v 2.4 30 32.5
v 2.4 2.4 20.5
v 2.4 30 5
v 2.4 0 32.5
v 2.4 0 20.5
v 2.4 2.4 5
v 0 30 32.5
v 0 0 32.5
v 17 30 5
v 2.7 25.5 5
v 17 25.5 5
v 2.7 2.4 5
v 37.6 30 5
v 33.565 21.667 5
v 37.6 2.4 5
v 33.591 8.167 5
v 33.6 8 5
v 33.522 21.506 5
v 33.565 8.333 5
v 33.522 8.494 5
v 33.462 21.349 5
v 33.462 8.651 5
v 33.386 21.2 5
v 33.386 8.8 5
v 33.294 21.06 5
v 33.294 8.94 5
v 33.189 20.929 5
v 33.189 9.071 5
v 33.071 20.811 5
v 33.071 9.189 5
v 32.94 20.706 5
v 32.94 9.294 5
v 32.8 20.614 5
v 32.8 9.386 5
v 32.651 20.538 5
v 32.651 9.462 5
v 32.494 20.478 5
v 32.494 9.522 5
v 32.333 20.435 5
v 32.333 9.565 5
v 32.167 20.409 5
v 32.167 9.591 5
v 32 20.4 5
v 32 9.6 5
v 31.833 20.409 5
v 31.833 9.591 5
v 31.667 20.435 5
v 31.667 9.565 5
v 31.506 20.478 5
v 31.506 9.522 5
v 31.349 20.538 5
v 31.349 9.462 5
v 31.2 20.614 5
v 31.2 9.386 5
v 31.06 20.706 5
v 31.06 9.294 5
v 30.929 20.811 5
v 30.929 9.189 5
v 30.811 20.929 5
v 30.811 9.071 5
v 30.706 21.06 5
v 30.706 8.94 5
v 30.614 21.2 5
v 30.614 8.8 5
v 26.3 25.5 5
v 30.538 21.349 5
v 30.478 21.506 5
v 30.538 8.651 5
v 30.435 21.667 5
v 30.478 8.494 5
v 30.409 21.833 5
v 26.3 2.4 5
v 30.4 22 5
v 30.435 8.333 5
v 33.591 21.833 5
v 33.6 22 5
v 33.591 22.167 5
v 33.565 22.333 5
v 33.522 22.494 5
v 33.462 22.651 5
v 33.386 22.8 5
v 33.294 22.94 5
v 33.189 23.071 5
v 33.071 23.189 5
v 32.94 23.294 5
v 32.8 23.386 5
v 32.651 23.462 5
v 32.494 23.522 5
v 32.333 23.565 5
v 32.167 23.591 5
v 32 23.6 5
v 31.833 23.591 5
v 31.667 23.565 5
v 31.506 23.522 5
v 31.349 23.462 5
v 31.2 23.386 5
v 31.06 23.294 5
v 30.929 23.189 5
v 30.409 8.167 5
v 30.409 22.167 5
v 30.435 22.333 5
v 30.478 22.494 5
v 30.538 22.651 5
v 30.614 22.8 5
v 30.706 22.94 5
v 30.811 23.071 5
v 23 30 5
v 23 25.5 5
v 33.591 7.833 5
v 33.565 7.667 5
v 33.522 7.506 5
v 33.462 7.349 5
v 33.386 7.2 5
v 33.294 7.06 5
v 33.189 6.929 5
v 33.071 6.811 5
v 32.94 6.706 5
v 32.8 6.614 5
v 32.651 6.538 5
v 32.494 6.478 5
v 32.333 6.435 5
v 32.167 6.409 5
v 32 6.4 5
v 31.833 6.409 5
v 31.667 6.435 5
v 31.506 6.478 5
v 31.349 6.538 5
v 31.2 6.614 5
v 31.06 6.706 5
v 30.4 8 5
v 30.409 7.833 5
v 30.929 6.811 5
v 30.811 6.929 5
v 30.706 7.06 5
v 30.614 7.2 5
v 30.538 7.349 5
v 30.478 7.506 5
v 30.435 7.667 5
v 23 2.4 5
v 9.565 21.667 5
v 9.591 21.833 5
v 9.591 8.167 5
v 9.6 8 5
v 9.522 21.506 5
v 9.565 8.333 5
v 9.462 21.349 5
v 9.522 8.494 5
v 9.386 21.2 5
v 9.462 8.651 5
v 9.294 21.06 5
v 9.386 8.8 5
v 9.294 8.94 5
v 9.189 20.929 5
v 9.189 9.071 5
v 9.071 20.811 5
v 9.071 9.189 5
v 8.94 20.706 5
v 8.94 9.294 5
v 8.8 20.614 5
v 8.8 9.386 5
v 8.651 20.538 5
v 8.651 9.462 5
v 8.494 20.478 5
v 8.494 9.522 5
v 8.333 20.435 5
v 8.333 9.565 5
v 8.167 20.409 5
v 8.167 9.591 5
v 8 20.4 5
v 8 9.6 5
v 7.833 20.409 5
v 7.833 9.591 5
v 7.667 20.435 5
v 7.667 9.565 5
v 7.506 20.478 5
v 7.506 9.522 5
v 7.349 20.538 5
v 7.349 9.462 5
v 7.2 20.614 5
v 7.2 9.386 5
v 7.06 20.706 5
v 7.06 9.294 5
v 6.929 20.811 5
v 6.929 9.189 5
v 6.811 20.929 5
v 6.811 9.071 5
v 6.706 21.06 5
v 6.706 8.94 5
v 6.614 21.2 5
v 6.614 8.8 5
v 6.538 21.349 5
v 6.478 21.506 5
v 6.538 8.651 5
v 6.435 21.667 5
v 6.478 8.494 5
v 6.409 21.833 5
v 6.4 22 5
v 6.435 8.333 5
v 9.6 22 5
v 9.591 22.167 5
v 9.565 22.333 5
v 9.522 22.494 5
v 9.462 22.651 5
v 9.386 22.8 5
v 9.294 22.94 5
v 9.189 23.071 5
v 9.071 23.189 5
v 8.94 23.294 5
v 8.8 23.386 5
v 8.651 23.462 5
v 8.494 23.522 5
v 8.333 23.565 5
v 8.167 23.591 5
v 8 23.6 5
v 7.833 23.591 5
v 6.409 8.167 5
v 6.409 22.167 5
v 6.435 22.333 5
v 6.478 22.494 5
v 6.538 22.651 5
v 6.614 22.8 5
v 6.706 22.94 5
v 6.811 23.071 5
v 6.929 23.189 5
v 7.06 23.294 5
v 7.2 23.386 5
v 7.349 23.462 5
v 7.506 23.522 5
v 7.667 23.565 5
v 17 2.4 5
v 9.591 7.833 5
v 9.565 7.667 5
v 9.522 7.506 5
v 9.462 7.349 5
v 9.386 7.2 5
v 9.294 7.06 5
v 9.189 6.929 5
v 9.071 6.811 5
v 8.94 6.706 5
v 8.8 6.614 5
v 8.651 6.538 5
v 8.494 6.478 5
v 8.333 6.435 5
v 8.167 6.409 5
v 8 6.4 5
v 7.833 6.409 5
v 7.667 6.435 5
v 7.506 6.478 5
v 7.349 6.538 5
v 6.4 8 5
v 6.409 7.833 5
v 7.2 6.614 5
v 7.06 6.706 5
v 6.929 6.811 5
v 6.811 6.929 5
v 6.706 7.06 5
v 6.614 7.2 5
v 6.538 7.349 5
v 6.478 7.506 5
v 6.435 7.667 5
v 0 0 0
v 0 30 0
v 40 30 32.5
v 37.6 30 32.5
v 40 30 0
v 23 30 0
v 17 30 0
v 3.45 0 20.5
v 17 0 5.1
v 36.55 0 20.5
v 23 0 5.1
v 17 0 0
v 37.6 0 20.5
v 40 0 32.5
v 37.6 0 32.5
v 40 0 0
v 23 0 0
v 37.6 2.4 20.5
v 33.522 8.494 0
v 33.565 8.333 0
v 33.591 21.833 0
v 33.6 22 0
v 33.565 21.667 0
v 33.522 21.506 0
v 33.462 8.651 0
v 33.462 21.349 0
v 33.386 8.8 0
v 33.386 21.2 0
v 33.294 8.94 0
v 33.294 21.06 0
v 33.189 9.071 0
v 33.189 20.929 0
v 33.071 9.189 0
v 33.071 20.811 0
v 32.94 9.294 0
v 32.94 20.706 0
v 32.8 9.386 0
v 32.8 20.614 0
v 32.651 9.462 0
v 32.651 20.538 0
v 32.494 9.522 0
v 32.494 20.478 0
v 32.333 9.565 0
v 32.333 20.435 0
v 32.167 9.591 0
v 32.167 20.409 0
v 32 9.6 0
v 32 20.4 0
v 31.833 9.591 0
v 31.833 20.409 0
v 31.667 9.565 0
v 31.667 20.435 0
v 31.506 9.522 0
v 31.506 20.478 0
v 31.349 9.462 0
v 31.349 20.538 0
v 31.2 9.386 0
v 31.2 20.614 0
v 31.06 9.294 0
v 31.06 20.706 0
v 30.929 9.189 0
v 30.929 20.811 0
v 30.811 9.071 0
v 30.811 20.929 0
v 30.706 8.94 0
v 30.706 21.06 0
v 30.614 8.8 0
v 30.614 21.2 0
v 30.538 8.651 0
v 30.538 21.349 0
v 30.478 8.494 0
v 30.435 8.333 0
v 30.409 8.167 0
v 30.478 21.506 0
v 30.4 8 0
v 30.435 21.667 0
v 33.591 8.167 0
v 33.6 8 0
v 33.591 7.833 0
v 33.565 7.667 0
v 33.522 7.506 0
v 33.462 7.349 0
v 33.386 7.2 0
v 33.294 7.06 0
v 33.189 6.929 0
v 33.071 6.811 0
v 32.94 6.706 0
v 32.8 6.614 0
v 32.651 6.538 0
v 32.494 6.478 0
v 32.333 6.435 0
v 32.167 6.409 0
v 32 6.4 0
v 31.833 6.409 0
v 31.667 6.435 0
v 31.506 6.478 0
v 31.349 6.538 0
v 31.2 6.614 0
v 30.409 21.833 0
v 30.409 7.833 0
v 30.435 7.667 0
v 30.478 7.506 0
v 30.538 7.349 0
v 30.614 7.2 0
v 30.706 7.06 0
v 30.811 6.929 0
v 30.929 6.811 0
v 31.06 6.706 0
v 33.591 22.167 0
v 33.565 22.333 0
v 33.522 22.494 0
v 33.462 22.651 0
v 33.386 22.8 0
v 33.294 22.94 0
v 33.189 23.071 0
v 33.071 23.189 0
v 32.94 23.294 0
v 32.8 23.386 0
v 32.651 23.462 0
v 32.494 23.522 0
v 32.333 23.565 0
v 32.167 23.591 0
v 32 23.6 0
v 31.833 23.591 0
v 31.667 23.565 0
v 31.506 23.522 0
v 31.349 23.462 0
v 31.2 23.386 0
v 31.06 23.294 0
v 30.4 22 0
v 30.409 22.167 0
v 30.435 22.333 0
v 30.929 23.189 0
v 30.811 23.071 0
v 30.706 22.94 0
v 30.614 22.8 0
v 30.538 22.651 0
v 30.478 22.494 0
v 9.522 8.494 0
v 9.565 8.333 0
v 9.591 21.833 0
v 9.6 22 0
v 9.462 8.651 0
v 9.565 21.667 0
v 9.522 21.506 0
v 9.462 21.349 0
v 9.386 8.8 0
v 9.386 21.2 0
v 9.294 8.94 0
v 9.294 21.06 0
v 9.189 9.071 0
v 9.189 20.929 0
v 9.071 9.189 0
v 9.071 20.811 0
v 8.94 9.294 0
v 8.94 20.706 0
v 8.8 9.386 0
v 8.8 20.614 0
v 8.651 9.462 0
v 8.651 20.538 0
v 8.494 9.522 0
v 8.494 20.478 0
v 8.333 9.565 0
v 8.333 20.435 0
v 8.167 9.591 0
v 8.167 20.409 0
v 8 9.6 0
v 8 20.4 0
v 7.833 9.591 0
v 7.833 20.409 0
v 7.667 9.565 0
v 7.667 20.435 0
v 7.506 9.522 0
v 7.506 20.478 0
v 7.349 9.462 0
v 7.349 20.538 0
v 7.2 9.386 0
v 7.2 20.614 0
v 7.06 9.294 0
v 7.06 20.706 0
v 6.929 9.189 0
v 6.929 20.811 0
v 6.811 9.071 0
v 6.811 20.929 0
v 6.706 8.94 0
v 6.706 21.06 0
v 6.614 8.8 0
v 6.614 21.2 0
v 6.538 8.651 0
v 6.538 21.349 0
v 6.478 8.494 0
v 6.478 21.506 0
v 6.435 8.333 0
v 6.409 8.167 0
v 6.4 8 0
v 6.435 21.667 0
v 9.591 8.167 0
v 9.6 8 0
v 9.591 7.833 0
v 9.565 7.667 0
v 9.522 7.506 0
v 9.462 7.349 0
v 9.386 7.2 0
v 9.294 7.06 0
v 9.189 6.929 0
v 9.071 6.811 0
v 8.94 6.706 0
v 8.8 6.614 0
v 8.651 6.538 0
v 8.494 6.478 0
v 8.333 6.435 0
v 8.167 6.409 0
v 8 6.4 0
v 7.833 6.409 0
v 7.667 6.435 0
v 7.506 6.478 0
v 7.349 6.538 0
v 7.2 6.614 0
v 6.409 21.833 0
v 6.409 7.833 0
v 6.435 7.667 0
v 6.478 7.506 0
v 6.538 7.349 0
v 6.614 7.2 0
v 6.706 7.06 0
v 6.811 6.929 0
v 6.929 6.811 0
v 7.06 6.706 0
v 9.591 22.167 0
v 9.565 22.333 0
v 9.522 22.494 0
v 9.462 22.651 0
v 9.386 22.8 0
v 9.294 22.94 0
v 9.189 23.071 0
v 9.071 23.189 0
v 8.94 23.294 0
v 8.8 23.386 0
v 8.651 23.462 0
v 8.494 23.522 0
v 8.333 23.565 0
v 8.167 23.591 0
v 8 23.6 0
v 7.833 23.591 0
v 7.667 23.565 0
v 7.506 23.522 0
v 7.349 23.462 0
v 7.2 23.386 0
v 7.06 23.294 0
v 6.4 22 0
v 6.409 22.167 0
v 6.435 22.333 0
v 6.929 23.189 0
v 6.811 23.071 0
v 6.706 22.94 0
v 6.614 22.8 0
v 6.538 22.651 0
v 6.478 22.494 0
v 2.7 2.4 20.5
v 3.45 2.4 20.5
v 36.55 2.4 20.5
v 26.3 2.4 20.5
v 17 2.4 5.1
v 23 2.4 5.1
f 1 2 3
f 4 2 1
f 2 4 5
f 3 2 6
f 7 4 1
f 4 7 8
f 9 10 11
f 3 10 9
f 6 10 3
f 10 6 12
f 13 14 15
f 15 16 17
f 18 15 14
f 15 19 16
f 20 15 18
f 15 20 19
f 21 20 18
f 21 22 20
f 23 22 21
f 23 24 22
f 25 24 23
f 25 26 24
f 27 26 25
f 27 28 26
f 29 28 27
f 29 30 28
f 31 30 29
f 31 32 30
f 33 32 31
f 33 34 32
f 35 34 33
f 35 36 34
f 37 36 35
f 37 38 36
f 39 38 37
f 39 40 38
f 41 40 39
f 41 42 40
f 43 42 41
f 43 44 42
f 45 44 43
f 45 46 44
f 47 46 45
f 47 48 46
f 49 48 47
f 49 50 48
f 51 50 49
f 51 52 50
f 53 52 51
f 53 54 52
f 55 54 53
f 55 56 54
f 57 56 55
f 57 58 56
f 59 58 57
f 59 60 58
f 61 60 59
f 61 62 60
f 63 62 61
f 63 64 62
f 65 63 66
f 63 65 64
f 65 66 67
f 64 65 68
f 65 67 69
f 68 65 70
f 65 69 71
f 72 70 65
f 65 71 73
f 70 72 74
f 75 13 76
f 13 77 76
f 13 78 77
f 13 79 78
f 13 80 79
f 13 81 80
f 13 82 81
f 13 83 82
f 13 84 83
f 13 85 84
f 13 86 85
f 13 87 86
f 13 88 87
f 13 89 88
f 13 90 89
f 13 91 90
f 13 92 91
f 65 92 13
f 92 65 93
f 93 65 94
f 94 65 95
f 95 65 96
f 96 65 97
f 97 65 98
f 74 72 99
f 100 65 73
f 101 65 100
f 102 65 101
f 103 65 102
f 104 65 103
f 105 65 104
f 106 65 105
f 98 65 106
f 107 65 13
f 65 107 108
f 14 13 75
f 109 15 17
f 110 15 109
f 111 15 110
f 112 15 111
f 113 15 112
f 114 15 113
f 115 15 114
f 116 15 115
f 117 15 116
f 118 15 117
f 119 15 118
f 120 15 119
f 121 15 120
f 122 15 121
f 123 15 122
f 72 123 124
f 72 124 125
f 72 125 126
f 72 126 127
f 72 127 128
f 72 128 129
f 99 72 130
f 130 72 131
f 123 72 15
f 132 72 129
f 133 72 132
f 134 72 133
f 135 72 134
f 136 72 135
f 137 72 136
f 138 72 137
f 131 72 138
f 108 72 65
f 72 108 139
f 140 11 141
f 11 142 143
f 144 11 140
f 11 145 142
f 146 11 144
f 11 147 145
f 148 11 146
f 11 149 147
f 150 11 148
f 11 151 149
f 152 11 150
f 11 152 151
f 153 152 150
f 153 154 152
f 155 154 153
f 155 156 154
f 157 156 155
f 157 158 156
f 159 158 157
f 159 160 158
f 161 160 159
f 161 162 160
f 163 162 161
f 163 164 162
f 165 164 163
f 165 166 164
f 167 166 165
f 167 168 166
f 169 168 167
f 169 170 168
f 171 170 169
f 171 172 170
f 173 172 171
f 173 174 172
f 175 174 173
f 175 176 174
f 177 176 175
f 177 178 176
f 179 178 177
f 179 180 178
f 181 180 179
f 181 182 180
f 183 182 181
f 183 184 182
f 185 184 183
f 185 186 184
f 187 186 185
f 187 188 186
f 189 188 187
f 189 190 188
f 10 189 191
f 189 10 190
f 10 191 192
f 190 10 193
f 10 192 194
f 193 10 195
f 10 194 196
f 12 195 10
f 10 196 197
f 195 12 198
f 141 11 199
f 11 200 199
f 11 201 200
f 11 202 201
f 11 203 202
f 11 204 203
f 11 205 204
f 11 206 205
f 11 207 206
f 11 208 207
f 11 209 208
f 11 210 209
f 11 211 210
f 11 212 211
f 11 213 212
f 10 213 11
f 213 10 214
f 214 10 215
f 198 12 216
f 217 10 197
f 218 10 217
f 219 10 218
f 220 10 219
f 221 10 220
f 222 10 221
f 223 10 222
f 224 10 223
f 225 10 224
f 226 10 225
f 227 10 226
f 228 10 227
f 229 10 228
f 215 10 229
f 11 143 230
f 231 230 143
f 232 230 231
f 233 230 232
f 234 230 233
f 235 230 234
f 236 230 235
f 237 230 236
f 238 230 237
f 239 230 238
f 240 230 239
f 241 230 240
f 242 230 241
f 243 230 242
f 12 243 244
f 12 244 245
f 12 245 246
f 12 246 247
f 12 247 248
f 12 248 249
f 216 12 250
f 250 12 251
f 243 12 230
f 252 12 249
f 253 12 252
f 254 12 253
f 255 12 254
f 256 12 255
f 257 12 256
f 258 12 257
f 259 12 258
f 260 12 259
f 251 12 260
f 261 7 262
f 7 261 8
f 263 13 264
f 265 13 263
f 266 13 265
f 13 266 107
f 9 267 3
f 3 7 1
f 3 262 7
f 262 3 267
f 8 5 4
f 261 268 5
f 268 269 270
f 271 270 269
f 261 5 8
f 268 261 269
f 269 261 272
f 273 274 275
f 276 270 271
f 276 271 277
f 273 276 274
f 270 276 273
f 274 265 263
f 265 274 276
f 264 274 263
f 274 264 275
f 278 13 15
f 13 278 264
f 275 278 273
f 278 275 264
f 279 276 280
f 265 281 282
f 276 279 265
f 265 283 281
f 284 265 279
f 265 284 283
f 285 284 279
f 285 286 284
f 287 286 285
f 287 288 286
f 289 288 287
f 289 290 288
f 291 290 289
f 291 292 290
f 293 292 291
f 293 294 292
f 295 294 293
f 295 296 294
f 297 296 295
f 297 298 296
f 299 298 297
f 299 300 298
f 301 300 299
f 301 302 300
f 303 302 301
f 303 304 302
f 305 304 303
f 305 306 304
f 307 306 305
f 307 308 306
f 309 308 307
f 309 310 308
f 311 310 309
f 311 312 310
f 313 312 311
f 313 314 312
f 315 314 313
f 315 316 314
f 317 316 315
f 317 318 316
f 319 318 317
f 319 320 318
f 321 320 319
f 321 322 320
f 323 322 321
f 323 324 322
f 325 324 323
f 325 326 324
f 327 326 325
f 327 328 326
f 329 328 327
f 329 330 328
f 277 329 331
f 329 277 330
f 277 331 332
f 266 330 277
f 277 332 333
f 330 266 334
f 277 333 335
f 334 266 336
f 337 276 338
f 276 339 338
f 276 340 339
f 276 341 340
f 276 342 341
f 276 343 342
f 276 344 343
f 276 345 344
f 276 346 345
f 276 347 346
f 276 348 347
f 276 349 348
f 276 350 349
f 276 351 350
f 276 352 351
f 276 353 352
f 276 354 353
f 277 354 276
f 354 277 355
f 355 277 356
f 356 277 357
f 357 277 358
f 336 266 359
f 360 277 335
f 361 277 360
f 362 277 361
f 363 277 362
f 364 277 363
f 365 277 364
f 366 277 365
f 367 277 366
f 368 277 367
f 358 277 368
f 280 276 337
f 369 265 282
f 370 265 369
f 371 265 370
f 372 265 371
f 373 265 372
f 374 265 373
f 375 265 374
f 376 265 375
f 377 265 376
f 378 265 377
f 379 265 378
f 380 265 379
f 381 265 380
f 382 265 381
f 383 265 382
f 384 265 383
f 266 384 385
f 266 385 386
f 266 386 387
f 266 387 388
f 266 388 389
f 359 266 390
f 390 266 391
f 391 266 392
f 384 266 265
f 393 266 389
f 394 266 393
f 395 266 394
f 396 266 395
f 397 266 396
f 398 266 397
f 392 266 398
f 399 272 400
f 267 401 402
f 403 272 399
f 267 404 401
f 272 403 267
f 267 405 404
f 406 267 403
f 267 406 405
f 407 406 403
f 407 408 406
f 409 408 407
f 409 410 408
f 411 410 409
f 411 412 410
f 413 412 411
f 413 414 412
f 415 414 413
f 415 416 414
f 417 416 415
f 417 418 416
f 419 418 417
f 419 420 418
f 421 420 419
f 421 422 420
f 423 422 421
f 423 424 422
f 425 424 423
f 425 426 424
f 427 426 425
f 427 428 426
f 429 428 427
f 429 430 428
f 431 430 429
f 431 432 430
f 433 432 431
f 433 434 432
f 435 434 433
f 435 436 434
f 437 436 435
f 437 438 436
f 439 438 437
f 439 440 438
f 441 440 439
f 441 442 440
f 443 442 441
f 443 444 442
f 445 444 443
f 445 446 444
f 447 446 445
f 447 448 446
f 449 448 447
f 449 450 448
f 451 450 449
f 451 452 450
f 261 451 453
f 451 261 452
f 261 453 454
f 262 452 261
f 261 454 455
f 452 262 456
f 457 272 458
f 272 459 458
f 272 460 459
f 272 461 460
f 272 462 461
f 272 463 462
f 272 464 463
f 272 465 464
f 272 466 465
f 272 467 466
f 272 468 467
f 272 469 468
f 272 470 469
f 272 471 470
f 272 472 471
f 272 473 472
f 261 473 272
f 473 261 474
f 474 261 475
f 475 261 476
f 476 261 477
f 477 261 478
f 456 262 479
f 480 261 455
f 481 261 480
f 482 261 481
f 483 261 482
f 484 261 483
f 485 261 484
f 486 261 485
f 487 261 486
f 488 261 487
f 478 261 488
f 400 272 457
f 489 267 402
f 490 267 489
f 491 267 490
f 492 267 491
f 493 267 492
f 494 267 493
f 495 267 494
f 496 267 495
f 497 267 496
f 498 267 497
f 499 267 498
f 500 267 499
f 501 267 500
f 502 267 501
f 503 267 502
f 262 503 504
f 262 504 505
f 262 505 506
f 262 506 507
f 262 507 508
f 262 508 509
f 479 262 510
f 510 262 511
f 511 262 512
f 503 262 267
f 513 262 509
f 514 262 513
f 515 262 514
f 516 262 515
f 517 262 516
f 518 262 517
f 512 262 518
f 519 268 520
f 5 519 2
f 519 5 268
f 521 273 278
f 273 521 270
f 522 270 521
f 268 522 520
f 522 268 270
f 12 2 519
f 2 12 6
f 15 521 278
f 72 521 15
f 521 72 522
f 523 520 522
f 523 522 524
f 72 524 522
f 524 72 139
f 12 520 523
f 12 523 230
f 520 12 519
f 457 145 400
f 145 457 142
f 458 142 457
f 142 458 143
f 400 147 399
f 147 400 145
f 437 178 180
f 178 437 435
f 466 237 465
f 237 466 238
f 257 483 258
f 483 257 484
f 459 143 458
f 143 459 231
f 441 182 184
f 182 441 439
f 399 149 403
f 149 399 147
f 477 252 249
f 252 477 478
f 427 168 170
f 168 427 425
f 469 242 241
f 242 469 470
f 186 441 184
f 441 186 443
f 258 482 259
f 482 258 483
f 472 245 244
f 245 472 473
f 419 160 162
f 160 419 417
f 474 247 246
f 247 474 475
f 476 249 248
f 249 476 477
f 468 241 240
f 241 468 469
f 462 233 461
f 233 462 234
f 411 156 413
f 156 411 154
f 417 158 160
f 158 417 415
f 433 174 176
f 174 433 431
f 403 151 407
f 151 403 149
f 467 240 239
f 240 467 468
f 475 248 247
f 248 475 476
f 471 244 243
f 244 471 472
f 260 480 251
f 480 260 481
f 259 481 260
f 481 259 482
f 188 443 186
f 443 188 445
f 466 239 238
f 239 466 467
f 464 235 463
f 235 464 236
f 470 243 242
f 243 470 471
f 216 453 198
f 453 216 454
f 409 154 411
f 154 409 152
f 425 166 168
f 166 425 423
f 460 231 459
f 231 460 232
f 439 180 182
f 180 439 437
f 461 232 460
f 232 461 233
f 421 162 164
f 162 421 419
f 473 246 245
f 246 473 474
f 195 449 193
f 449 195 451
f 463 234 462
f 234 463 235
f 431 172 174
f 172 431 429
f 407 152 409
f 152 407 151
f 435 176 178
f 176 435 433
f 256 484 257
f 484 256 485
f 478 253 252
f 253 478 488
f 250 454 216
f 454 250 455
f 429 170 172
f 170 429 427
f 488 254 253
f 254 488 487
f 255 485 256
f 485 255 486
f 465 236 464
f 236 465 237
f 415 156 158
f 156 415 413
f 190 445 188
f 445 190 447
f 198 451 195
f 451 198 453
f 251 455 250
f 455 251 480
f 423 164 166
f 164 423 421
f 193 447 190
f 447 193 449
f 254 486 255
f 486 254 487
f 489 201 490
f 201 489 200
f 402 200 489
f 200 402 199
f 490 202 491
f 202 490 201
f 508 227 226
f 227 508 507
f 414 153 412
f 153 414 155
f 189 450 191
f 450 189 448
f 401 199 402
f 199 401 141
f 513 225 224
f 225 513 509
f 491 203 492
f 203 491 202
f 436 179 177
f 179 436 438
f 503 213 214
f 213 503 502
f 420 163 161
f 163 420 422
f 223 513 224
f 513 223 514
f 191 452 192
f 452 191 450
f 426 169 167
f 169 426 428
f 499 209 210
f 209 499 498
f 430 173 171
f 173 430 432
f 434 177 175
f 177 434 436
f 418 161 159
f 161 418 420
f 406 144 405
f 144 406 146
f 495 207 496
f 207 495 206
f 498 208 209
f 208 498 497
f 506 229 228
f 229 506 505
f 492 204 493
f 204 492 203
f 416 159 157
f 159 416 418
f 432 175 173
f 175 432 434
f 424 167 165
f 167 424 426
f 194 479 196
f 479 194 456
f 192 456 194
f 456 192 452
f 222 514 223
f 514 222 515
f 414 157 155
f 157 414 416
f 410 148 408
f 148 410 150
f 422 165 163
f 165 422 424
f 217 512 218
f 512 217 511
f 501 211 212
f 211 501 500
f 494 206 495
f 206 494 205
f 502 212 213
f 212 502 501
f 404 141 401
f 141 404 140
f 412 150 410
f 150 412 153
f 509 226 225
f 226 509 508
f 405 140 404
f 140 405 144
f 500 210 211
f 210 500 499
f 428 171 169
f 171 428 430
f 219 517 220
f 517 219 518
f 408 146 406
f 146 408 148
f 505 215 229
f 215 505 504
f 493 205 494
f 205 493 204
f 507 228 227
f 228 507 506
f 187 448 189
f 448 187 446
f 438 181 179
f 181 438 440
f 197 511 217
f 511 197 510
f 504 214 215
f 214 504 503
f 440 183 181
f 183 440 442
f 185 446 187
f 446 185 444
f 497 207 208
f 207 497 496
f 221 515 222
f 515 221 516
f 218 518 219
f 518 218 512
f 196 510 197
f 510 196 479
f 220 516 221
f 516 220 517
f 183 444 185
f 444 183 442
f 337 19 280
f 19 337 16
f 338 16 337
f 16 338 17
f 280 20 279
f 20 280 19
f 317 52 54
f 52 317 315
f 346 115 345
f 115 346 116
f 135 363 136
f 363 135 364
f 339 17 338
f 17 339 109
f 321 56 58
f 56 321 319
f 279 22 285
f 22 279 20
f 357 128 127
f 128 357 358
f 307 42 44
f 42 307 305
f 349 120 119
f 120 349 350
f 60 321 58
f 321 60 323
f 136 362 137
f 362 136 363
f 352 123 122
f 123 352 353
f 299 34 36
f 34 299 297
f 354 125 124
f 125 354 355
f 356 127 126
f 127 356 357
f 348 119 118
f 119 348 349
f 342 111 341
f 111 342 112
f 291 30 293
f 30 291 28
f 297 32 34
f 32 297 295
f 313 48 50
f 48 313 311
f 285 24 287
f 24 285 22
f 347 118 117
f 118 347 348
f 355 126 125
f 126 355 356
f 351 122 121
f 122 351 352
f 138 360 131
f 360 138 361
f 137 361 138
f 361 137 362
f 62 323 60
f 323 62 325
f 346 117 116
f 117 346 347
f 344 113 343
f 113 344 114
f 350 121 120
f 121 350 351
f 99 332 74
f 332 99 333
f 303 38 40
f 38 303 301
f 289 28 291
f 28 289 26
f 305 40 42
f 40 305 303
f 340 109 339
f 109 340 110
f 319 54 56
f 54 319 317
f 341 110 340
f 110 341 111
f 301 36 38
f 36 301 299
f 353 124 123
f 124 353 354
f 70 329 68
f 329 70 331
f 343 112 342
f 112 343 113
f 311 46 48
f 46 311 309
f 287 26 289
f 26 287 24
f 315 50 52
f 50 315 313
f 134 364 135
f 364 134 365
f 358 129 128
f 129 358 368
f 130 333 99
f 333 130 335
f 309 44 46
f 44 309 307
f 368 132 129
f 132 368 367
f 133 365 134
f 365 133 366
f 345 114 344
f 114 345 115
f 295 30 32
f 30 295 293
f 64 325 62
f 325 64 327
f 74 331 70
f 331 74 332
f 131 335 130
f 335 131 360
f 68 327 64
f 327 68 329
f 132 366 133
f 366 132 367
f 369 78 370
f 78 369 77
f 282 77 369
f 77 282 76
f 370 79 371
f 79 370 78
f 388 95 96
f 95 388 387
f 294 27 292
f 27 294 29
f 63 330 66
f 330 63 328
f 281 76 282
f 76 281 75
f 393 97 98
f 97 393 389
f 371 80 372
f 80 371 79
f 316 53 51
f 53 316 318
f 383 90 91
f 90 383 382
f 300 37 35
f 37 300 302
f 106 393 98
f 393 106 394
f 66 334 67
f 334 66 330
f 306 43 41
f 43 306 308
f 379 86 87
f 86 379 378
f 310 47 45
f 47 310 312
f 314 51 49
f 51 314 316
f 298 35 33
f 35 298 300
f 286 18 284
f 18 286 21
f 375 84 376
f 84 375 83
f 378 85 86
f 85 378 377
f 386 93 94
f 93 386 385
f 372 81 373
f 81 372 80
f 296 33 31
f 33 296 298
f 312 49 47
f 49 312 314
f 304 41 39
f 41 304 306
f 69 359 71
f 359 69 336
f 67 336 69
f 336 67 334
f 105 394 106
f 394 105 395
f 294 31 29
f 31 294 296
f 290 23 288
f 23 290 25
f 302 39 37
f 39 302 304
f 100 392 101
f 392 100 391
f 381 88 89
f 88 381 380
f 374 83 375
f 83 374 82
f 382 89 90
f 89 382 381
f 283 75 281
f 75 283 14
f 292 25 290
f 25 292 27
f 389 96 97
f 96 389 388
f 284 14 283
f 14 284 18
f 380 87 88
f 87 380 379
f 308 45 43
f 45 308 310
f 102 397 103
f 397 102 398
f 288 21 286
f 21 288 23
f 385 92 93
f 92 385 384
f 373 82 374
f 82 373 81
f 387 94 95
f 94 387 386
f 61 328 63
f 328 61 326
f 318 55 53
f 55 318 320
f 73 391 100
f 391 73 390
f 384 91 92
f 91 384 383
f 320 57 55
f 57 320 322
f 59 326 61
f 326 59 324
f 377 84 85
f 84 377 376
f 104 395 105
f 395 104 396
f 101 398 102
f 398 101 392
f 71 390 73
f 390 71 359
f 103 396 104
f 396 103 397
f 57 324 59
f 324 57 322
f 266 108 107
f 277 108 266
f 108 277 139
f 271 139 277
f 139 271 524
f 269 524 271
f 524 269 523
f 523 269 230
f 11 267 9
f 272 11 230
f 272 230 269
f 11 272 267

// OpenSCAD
// file: parameters.scad
// =============================================================================
// Coil Winder - Common Parameters
// DTU 34621 Metal Detector Project
// =============================================================================

// -----------------------------------------------------------------------------
// Hardware Dimensions
// -----------------------------------------------------------------------------

// M8 Threaded Rod (Spindle)
spindle_dia = 8;
spindle_length = 300;

// 608ZZ Bearing (Skateboard bearing)
bearing_od = 22;
bearing_id = 8;
bearing_width = 7;

// M3 Hardware
m3_bolt_dia = 3.2;
m3_nut_dia = 6.4;
m3_nut_height = 2.4;
m3_head_dia = 5.5;
m3_head_height = 3;

// M8 Hardware
m8_nut_dia = 14.6;
m8_nut_height = 6.5;

// -----------------------------------------------------------------------------
// Servo Dimensions (SG90 / MG90S style)
// -----------------------------------------------------------------------------

servo_body_w = 23;
servo_body_h = 22.5;
servo_body_d = 12.5;
servo_tab_w = 32.5;
servo_tab_h = 2.5;
servo_tab_offset = 15.5;  // from bottom
servo_mount_hole_spacing = 28;
servo_shaft_offset = 5.5;  // from center of body
servo_horn_length = 15;

// -----------------------------------------------------------------------------
// ITR8307 Optical Sensor
// -----------------------------------------------------------------------------

itr8307_width = 10.8;
itr8307_depth = 5.2;
itr8307_height = 6.3;
itr8307_slot_width = 3;
itr8307_slot_depth = 4;

// -----------------------------------------------------------------------------
// Coil Dimensions
// -----------------------------------------------------------------------------

// TX Coil - 200mm diameter
tx_coil_dia = 200;
tx_coil_width = 18;
tx_coil_turns = 68;

// RX Coil - 80mm diameter
rx_coil_dia = 80;
rx_coil_width = 14;
rx_coil_turns = 170;

// Bucking Coil - 120mm diameter
buck_coil_dia = 120;
buck_coil_width = 18;
buck_coil_turns = 35;

// -----------------------------------------------------------------------------
// Frame Dimensions
// -----------------------------------------------------------------------------

base_length = 250;
base_width = 120;
base_thickness = 5;

bearing_mount_height = 40;
bearing_mount_width = 35;
bearing_mount_depth = 25;

// Distance between bearing centers
spindle_span = 200;

// -----------------------------------------------------------------------------
// Wire Guide / Traverse
// -----------------------------------------------------------------------------

guide_rail_length = 80;
guide_rail_width = 10;
guide_rail_height = 5;

carriage_width = 25;
carriage_depth = 20;
carriage_height = 15;

// -----------------------------------------------------------------------------
// Encoder Wheel
// -----------------------------------------------------------------------------

encoder_wheel_dia = 40;
encoder_wheel_thickness = 5;
encoder_slot_width = 5;
encoder_slot_depth = 12;

// -----------------------------------------------------------------------------
// General Tolerances
// -----------------------------------------------------------------------------

clearance = 0.3;        // General clearance for fitting parts
press_fit = 0.1;        // Tight fit
slide_fit = 0.4;        // Sliding fit

// -----------------------------------------------------------------------------
// Print Settings
// -----------------------------------------------------------------------------

wall_thickness = 2.4;   // 3 perimeters at 0.4mm nozzle
layer_height = 0.2;

$fn = 60;  // Circle resolution
// main file
// =============================================================================
// Servo Mount - Holds SG90/MG90S servo for wire guide traverse
// =============================================================================

include <parameters.scad>

mount_base_width = 40;
mount_base_depth = 30;
mount_base_height = 5;

module servo_mount() {
    difference() {
        union() {
            // Base plate
            cube([mount_base_width, mount_base_depth, mount_base_height]);

            // Servo cradle walls
            translate([0, 0, mount_base_height]) {
                // Left wall
                cube([wall_thickness, mount_base_depth, servo_body_h + 5]);
                // Right wall
                translate([mount_base_width - wall_thickness, 0, 0])
                    cube([wall_thickness, mount_base_depth, servo_body_h + 5]);
            }

            // Front support
            translate([0, 0, mount_base_height])
                cube([mount_base_width, wall_thickness, servo_tab_offset]);
        }

        // Servo body cutout
        translate([wall_thickness + clearance, wall_thickness, mount_base_height])
            cube([servo_body_w + clearance*2, servo_body_d + clearance*2 + 10, servo_body_h + 10]);

        // Tab slots
        translate([(mount_base_width - servo_tab_w)/2 - clearance, -0.1, mount_base_height + servo_tab_offset])
            cube([servo_tab_w + clearance*2, wall_thickness + 0.2, servo_tab_h + clearance*2]);

        // Mounting holes (M3)
        for (x = [8, mount_base_width - 8]) {
            for (y = [8, mount_base_depth - 8]) {
                translate([x, y, -0.1])
                    cylinder(d=m3_bolt_dia, h=mount_base_height + 0.2);
            }
        }

        // Wire routing slot
        translate([mount_base_width/2 - 3, -0.1, -0.1])
            cube([6, mount_base_depth + 0.2, mount_base_height + 0.2]);
    }
}

// Render for export
servo_mount();
